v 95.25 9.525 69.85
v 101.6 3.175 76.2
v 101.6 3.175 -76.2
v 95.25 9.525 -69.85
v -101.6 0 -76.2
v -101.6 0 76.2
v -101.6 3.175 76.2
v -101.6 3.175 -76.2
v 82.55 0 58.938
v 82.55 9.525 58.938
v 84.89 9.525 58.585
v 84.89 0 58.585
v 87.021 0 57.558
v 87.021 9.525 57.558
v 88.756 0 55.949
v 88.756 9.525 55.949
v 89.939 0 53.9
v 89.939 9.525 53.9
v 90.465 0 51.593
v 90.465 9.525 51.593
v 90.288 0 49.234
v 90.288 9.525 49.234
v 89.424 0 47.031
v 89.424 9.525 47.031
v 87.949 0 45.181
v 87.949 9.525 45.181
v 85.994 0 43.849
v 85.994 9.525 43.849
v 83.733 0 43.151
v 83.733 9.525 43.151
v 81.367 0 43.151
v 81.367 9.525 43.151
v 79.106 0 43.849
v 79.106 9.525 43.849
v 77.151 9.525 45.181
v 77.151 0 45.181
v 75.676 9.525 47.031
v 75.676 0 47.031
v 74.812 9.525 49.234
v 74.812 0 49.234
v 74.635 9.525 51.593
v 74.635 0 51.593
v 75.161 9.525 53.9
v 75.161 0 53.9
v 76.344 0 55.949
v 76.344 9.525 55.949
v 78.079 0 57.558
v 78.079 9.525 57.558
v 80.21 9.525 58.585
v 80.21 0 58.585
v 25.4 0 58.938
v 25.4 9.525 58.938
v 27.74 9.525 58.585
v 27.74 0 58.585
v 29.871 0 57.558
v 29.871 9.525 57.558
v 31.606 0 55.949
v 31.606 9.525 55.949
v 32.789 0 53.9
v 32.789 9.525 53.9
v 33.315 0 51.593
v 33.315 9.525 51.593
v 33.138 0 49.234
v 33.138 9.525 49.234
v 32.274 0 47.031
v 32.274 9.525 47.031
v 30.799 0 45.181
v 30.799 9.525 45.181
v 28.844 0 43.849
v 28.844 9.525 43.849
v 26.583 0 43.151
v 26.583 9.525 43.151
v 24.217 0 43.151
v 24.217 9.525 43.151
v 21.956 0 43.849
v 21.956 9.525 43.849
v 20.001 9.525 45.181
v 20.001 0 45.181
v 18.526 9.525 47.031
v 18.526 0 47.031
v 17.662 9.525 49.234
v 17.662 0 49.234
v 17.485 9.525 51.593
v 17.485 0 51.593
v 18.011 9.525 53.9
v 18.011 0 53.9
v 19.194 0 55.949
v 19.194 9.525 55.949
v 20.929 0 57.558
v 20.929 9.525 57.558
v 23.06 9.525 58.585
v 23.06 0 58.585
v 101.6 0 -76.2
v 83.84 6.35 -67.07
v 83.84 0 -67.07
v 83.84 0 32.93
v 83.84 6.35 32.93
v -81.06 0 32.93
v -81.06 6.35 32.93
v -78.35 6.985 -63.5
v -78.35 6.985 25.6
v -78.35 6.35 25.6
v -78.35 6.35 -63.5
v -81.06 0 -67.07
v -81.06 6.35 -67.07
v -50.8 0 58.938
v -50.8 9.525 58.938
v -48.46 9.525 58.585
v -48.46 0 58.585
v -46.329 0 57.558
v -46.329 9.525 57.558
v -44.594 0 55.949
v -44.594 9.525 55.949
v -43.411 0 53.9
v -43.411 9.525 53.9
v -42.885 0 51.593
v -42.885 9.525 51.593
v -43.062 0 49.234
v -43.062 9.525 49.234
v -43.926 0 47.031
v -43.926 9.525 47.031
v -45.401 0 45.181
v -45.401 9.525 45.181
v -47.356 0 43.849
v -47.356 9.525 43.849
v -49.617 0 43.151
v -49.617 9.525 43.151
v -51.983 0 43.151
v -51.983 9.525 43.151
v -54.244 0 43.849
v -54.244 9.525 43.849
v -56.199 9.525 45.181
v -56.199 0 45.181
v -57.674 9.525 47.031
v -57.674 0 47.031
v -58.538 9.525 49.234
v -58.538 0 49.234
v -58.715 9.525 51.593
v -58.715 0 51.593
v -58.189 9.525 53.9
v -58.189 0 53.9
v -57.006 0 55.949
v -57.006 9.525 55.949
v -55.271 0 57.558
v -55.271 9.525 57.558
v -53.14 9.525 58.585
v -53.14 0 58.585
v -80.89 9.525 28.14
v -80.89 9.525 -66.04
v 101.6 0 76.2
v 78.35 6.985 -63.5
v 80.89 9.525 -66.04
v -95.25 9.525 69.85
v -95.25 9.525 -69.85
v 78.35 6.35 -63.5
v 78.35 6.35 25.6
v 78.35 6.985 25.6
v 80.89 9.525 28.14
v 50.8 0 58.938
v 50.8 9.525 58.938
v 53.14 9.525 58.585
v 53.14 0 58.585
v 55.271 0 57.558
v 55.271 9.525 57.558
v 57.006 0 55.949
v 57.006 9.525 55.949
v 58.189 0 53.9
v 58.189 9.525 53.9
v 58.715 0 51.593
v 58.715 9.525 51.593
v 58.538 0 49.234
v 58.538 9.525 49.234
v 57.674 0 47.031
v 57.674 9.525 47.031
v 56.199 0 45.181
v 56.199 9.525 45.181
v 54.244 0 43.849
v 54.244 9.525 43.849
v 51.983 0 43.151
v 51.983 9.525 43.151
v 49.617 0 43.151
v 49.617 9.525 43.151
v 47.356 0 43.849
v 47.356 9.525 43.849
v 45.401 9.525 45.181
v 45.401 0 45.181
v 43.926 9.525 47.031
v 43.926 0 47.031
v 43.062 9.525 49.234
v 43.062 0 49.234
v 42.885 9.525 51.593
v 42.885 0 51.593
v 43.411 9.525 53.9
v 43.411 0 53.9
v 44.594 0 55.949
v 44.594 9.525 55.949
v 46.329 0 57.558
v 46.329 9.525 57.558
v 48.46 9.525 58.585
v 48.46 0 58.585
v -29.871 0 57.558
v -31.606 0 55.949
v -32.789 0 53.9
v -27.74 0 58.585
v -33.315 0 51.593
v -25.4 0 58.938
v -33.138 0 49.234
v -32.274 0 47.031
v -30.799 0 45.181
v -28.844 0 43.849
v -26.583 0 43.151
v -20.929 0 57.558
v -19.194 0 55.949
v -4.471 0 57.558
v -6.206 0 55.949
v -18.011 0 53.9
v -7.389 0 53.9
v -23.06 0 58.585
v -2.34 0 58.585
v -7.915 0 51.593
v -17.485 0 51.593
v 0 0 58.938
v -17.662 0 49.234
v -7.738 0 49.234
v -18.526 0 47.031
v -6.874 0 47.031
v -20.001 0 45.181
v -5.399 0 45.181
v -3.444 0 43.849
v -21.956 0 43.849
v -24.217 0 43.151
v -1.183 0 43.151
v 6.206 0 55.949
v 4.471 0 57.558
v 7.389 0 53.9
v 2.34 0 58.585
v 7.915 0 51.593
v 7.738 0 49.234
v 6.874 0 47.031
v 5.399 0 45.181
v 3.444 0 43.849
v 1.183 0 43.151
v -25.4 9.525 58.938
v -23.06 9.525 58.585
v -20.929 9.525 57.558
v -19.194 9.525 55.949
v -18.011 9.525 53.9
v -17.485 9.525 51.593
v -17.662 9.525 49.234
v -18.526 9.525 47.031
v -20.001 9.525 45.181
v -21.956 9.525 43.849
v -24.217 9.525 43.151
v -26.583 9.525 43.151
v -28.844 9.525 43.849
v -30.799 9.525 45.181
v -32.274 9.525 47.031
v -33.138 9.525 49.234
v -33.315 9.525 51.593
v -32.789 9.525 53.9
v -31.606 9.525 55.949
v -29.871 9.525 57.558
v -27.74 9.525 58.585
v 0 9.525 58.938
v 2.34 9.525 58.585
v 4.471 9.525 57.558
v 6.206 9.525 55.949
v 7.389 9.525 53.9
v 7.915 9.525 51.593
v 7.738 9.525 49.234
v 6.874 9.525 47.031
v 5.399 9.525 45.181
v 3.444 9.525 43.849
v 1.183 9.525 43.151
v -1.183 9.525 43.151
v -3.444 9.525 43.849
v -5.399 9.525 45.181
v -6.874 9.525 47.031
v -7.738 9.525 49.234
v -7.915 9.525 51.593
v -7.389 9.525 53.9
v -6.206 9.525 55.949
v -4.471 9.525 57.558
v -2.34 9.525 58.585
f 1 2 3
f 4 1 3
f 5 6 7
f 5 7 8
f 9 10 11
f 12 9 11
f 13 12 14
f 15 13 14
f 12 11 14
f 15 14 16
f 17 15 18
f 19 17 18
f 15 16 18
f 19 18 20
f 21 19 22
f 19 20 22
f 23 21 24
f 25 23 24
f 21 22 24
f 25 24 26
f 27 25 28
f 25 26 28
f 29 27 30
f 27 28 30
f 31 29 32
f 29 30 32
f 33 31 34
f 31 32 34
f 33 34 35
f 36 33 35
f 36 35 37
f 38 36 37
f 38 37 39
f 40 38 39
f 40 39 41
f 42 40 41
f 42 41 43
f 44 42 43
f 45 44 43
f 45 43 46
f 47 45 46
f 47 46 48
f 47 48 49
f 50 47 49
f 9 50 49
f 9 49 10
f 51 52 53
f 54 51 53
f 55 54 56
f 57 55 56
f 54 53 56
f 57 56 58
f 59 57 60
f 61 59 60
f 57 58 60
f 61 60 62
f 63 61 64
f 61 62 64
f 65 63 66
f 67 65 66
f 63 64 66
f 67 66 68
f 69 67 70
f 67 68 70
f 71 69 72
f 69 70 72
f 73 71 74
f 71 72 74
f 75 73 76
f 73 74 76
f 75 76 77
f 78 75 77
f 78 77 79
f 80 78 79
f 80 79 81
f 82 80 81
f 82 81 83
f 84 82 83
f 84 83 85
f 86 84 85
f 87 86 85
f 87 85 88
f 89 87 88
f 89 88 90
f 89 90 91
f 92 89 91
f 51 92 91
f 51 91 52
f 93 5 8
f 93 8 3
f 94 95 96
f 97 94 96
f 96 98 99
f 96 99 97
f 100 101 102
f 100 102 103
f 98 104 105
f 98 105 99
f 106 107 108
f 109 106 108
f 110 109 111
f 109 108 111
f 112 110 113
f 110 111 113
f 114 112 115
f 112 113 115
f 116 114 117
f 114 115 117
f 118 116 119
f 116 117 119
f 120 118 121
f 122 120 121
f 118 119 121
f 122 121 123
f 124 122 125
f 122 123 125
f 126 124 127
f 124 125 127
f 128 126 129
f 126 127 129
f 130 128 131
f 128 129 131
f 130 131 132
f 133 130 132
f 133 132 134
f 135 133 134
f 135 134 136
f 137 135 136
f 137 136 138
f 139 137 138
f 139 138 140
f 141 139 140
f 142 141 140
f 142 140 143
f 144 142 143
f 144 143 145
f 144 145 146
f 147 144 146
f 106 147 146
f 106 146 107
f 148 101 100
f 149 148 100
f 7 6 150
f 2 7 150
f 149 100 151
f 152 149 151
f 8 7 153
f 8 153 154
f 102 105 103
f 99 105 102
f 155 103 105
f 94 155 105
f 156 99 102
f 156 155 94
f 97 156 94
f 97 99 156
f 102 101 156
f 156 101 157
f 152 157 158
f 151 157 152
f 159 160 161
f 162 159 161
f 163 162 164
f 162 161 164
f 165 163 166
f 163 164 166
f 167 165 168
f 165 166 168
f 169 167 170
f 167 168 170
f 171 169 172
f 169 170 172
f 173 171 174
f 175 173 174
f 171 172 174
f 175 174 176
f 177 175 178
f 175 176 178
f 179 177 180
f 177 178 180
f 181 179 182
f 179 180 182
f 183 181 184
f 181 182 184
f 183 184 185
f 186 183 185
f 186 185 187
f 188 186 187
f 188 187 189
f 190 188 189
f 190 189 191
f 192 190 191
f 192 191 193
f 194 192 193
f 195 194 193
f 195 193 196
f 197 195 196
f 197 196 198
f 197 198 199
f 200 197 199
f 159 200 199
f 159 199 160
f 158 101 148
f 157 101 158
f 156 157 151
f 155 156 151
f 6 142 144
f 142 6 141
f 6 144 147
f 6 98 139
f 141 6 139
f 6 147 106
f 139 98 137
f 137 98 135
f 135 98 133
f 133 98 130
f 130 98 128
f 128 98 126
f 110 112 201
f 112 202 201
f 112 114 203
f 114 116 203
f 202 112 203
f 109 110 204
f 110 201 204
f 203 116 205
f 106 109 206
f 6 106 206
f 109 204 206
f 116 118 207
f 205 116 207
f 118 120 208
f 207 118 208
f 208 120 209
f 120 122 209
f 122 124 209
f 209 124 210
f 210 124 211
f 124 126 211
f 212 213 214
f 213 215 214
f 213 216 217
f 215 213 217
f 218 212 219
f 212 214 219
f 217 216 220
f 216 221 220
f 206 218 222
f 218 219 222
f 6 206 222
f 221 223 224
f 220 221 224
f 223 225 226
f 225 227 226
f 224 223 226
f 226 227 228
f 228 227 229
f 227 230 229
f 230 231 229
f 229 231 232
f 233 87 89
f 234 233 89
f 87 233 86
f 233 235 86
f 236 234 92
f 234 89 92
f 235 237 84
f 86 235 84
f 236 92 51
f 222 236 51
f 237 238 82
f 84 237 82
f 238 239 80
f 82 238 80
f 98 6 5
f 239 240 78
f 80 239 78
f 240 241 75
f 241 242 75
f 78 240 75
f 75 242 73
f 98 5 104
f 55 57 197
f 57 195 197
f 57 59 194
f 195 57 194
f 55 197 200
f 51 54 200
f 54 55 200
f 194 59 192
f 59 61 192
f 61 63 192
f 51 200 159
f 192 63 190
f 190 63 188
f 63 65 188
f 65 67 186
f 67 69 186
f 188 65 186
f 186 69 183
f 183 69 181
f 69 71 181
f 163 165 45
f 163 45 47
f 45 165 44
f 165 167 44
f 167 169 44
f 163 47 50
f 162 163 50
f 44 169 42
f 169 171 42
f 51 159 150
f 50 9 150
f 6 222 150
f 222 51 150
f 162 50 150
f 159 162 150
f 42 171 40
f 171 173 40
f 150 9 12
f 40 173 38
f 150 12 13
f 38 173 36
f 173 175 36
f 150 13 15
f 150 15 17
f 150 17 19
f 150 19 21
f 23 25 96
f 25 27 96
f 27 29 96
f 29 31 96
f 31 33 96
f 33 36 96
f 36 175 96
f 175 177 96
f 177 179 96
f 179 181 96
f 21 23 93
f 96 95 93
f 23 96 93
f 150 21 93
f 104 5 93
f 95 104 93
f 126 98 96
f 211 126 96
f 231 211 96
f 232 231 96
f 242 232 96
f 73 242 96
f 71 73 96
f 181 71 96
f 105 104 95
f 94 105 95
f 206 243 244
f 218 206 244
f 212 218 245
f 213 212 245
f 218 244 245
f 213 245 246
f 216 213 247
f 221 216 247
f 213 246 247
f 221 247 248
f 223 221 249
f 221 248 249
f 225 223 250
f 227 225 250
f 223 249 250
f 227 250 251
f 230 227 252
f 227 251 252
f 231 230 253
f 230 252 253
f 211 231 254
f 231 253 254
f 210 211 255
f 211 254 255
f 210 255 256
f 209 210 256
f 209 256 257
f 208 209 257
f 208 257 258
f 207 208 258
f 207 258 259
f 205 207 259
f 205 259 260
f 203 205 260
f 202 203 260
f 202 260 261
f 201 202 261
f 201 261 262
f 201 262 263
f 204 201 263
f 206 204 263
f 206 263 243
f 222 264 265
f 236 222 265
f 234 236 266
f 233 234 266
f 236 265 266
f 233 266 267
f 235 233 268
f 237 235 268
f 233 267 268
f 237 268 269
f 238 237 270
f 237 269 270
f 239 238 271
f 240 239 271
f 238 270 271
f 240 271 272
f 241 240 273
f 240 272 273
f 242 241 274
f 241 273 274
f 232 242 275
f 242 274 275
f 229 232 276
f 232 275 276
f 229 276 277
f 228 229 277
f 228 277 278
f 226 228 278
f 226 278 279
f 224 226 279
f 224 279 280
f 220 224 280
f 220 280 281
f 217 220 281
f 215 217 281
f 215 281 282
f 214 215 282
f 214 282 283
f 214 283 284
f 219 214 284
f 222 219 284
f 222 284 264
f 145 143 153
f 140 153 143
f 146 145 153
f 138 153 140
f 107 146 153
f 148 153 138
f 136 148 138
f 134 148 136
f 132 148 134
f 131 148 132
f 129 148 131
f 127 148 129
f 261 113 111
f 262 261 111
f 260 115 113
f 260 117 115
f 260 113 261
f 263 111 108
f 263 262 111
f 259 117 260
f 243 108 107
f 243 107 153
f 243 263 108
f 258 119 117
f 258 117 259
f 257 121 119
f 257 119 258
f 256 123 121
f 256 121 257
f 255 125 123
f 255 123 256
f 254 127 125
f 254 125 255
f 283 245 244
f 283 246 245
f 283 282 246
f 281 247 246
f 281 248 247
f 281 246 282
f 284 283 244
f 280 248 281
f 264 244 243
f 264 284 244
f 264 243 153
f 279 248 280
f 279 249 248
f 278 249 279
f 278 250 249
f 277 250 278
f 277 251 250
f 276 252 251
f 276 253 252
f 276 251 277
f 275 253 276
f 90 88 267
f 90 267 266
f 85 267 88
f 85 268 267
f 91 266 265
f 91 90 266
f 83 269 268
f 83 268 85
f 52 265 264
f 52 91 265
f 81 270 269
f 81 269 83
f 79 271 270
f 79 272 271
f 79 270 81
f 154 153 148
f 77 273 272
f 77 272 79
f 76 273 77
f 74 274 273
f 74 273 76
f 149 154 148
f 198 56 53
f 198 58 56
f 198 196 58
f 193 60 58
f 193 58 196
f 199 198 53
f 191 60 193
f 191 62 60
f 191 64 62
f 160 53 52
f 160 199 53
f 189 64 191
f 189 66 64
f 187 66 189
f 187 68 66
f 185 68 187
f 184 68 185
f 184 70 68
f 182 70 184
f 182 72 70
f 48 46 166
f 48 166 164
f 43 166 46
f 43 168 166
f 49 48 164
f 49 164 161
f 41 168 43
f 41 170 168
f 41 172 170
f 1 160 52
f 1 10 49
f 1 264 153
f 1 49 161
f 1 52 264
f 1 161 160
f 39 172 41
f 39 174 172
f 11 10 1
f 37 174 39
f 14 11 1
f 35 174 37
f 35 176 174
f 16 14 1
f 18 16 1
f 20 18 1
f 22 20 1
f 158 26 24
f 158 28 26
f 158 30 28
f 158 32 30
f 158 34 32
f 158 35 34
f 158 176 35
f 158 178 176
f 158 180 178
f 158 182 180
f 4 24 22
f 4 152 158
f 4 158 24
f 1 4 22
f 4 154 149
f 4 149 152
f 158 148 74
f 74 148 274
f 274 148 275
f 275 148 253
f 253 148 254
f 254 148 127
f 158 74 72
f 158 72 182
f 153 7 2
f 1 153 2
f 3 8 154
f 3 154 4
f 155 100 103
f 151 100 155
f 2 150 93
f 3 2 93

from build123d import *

# Parameters (mm, degrees)
SKETCH1_W           = 203.2
SKETCH1_H           = 152.4
BOSS_EXTRUDE1_DEPTH = 9.525
SKETCH2_W           = 156.7
SKETCH2_H           = 89.1
CUT_EXTRUDE1_DEPTH  = 128.356686613
CHAMFER1_SIZE       = 2.54
SKETCH3_W           = 164.9
SKETCH3_H           = 100
CUT_EXTRUDE2_DEPTH  = 6.35
SKETCH4_R           = 7.9375
CUT_EXTRUDE3_DEPTH  = 128.356686613
CHAMFER2_SIZE       = 6.35


with BuildPart() as part:
    # Sketch1 → Boss-Extrude1 (new body)
    with BuildSketch(Plane(origin=(0, 0, 0), x_dir=(1, 0, 0), z_dir=(0, 1, 0))):
        Rectangle(SKETCH1_W, SKETCH1_H)
    extrude(amount=BOSS_EXTRUDE1_DEPTH)

    # Sketch2 → Cut-Extrude1 (cut, through all)
    with BuildSketch(Plane(origin=(0, 9.525, 0), x_dir=(1, 0, 0), z_dir=(0, 1, 0))):
        with Locations((0, 18.95)):
            Rectangle(SKETCH2_W, SKETCH2_H)
    extrude(amount=-CUT_EXTRUDE1_DEPTH, mode=Mode.SUBTRACT)

    # Chamfer1
    chamfer1_edges = [part.edges().sort_by_distance(p)[0] for p in [
        (78.35, 9.525, -18.95),
        (0, 9.525, -63.5),
        (-78.35, 9.525, -18.95),
        (0, 9.525, 25.6),
    ]]
    chamfer(chamfer1_edges, length=CHAMFER1_SIZE)

    # Sketch3 → Cut-Extrude2 (cut)
    with BuildSketch(Plane(origin=(-44.720558265, 0, -165.453357273), x_dir=(1, 0, 0), z_dir=(0, -1, 0))):
        with Locations((46.110558265, 148.383357273)):
            Rectangle(SKETCH3_W, SKETCH3_H)
    extrude(amount=-CUT_EXTRUDE2_DEPTH, mode=Mode.SUBTRACT)

    # Sketch4 → Cut-Extrude3 (cut, through all)
    with BuildSketch(Plane(origin=(0, 9.525, 0), x_dir=(1, 0, 0), z_dir=(0, 1, 0))):
        with Locations(Location((-50.8, -51, 0), (0, 0, 270))):
            Circle(SKETCH4_R)
        with Locations(Location((-25.4, -51, 0), (0, 0, 270))):
            Circle(SKETCH4_R)
        with Locations(Location((0, -51, 0), (0, 0, 270))):
            Circle(SKETCH4_R)
        with Locations(Location((25.4, -51, 0), (0, 0, 270))):
            Circle(SKETCH4_R)
        with Locations(Location((50.8, -51, 0), (0, 0, 270))):
            Circle(SKETCH4_R)
        with Locations(Location((82.55, -51, 0), (0, 0, 270))):
            Circle(SKETCH4_R)
    extrude(amount=-CUT_EXTRUDE3_DEPTH, mode=Mode.SUBTRACT)

    # Chamfer2
    chamfer2_edges = [part.edges().sort_by_distance(p)[0] for p in [
        (-101.6, 9.525, 0),
        (0, 9.525, 76.2),
        (101.6, 9.525, 0),
        (0, 9.525, -76.2),
    ]]
    chamfer(chamfer2_edges, length=CHAMFER2_SIZE)


solid = part.part
